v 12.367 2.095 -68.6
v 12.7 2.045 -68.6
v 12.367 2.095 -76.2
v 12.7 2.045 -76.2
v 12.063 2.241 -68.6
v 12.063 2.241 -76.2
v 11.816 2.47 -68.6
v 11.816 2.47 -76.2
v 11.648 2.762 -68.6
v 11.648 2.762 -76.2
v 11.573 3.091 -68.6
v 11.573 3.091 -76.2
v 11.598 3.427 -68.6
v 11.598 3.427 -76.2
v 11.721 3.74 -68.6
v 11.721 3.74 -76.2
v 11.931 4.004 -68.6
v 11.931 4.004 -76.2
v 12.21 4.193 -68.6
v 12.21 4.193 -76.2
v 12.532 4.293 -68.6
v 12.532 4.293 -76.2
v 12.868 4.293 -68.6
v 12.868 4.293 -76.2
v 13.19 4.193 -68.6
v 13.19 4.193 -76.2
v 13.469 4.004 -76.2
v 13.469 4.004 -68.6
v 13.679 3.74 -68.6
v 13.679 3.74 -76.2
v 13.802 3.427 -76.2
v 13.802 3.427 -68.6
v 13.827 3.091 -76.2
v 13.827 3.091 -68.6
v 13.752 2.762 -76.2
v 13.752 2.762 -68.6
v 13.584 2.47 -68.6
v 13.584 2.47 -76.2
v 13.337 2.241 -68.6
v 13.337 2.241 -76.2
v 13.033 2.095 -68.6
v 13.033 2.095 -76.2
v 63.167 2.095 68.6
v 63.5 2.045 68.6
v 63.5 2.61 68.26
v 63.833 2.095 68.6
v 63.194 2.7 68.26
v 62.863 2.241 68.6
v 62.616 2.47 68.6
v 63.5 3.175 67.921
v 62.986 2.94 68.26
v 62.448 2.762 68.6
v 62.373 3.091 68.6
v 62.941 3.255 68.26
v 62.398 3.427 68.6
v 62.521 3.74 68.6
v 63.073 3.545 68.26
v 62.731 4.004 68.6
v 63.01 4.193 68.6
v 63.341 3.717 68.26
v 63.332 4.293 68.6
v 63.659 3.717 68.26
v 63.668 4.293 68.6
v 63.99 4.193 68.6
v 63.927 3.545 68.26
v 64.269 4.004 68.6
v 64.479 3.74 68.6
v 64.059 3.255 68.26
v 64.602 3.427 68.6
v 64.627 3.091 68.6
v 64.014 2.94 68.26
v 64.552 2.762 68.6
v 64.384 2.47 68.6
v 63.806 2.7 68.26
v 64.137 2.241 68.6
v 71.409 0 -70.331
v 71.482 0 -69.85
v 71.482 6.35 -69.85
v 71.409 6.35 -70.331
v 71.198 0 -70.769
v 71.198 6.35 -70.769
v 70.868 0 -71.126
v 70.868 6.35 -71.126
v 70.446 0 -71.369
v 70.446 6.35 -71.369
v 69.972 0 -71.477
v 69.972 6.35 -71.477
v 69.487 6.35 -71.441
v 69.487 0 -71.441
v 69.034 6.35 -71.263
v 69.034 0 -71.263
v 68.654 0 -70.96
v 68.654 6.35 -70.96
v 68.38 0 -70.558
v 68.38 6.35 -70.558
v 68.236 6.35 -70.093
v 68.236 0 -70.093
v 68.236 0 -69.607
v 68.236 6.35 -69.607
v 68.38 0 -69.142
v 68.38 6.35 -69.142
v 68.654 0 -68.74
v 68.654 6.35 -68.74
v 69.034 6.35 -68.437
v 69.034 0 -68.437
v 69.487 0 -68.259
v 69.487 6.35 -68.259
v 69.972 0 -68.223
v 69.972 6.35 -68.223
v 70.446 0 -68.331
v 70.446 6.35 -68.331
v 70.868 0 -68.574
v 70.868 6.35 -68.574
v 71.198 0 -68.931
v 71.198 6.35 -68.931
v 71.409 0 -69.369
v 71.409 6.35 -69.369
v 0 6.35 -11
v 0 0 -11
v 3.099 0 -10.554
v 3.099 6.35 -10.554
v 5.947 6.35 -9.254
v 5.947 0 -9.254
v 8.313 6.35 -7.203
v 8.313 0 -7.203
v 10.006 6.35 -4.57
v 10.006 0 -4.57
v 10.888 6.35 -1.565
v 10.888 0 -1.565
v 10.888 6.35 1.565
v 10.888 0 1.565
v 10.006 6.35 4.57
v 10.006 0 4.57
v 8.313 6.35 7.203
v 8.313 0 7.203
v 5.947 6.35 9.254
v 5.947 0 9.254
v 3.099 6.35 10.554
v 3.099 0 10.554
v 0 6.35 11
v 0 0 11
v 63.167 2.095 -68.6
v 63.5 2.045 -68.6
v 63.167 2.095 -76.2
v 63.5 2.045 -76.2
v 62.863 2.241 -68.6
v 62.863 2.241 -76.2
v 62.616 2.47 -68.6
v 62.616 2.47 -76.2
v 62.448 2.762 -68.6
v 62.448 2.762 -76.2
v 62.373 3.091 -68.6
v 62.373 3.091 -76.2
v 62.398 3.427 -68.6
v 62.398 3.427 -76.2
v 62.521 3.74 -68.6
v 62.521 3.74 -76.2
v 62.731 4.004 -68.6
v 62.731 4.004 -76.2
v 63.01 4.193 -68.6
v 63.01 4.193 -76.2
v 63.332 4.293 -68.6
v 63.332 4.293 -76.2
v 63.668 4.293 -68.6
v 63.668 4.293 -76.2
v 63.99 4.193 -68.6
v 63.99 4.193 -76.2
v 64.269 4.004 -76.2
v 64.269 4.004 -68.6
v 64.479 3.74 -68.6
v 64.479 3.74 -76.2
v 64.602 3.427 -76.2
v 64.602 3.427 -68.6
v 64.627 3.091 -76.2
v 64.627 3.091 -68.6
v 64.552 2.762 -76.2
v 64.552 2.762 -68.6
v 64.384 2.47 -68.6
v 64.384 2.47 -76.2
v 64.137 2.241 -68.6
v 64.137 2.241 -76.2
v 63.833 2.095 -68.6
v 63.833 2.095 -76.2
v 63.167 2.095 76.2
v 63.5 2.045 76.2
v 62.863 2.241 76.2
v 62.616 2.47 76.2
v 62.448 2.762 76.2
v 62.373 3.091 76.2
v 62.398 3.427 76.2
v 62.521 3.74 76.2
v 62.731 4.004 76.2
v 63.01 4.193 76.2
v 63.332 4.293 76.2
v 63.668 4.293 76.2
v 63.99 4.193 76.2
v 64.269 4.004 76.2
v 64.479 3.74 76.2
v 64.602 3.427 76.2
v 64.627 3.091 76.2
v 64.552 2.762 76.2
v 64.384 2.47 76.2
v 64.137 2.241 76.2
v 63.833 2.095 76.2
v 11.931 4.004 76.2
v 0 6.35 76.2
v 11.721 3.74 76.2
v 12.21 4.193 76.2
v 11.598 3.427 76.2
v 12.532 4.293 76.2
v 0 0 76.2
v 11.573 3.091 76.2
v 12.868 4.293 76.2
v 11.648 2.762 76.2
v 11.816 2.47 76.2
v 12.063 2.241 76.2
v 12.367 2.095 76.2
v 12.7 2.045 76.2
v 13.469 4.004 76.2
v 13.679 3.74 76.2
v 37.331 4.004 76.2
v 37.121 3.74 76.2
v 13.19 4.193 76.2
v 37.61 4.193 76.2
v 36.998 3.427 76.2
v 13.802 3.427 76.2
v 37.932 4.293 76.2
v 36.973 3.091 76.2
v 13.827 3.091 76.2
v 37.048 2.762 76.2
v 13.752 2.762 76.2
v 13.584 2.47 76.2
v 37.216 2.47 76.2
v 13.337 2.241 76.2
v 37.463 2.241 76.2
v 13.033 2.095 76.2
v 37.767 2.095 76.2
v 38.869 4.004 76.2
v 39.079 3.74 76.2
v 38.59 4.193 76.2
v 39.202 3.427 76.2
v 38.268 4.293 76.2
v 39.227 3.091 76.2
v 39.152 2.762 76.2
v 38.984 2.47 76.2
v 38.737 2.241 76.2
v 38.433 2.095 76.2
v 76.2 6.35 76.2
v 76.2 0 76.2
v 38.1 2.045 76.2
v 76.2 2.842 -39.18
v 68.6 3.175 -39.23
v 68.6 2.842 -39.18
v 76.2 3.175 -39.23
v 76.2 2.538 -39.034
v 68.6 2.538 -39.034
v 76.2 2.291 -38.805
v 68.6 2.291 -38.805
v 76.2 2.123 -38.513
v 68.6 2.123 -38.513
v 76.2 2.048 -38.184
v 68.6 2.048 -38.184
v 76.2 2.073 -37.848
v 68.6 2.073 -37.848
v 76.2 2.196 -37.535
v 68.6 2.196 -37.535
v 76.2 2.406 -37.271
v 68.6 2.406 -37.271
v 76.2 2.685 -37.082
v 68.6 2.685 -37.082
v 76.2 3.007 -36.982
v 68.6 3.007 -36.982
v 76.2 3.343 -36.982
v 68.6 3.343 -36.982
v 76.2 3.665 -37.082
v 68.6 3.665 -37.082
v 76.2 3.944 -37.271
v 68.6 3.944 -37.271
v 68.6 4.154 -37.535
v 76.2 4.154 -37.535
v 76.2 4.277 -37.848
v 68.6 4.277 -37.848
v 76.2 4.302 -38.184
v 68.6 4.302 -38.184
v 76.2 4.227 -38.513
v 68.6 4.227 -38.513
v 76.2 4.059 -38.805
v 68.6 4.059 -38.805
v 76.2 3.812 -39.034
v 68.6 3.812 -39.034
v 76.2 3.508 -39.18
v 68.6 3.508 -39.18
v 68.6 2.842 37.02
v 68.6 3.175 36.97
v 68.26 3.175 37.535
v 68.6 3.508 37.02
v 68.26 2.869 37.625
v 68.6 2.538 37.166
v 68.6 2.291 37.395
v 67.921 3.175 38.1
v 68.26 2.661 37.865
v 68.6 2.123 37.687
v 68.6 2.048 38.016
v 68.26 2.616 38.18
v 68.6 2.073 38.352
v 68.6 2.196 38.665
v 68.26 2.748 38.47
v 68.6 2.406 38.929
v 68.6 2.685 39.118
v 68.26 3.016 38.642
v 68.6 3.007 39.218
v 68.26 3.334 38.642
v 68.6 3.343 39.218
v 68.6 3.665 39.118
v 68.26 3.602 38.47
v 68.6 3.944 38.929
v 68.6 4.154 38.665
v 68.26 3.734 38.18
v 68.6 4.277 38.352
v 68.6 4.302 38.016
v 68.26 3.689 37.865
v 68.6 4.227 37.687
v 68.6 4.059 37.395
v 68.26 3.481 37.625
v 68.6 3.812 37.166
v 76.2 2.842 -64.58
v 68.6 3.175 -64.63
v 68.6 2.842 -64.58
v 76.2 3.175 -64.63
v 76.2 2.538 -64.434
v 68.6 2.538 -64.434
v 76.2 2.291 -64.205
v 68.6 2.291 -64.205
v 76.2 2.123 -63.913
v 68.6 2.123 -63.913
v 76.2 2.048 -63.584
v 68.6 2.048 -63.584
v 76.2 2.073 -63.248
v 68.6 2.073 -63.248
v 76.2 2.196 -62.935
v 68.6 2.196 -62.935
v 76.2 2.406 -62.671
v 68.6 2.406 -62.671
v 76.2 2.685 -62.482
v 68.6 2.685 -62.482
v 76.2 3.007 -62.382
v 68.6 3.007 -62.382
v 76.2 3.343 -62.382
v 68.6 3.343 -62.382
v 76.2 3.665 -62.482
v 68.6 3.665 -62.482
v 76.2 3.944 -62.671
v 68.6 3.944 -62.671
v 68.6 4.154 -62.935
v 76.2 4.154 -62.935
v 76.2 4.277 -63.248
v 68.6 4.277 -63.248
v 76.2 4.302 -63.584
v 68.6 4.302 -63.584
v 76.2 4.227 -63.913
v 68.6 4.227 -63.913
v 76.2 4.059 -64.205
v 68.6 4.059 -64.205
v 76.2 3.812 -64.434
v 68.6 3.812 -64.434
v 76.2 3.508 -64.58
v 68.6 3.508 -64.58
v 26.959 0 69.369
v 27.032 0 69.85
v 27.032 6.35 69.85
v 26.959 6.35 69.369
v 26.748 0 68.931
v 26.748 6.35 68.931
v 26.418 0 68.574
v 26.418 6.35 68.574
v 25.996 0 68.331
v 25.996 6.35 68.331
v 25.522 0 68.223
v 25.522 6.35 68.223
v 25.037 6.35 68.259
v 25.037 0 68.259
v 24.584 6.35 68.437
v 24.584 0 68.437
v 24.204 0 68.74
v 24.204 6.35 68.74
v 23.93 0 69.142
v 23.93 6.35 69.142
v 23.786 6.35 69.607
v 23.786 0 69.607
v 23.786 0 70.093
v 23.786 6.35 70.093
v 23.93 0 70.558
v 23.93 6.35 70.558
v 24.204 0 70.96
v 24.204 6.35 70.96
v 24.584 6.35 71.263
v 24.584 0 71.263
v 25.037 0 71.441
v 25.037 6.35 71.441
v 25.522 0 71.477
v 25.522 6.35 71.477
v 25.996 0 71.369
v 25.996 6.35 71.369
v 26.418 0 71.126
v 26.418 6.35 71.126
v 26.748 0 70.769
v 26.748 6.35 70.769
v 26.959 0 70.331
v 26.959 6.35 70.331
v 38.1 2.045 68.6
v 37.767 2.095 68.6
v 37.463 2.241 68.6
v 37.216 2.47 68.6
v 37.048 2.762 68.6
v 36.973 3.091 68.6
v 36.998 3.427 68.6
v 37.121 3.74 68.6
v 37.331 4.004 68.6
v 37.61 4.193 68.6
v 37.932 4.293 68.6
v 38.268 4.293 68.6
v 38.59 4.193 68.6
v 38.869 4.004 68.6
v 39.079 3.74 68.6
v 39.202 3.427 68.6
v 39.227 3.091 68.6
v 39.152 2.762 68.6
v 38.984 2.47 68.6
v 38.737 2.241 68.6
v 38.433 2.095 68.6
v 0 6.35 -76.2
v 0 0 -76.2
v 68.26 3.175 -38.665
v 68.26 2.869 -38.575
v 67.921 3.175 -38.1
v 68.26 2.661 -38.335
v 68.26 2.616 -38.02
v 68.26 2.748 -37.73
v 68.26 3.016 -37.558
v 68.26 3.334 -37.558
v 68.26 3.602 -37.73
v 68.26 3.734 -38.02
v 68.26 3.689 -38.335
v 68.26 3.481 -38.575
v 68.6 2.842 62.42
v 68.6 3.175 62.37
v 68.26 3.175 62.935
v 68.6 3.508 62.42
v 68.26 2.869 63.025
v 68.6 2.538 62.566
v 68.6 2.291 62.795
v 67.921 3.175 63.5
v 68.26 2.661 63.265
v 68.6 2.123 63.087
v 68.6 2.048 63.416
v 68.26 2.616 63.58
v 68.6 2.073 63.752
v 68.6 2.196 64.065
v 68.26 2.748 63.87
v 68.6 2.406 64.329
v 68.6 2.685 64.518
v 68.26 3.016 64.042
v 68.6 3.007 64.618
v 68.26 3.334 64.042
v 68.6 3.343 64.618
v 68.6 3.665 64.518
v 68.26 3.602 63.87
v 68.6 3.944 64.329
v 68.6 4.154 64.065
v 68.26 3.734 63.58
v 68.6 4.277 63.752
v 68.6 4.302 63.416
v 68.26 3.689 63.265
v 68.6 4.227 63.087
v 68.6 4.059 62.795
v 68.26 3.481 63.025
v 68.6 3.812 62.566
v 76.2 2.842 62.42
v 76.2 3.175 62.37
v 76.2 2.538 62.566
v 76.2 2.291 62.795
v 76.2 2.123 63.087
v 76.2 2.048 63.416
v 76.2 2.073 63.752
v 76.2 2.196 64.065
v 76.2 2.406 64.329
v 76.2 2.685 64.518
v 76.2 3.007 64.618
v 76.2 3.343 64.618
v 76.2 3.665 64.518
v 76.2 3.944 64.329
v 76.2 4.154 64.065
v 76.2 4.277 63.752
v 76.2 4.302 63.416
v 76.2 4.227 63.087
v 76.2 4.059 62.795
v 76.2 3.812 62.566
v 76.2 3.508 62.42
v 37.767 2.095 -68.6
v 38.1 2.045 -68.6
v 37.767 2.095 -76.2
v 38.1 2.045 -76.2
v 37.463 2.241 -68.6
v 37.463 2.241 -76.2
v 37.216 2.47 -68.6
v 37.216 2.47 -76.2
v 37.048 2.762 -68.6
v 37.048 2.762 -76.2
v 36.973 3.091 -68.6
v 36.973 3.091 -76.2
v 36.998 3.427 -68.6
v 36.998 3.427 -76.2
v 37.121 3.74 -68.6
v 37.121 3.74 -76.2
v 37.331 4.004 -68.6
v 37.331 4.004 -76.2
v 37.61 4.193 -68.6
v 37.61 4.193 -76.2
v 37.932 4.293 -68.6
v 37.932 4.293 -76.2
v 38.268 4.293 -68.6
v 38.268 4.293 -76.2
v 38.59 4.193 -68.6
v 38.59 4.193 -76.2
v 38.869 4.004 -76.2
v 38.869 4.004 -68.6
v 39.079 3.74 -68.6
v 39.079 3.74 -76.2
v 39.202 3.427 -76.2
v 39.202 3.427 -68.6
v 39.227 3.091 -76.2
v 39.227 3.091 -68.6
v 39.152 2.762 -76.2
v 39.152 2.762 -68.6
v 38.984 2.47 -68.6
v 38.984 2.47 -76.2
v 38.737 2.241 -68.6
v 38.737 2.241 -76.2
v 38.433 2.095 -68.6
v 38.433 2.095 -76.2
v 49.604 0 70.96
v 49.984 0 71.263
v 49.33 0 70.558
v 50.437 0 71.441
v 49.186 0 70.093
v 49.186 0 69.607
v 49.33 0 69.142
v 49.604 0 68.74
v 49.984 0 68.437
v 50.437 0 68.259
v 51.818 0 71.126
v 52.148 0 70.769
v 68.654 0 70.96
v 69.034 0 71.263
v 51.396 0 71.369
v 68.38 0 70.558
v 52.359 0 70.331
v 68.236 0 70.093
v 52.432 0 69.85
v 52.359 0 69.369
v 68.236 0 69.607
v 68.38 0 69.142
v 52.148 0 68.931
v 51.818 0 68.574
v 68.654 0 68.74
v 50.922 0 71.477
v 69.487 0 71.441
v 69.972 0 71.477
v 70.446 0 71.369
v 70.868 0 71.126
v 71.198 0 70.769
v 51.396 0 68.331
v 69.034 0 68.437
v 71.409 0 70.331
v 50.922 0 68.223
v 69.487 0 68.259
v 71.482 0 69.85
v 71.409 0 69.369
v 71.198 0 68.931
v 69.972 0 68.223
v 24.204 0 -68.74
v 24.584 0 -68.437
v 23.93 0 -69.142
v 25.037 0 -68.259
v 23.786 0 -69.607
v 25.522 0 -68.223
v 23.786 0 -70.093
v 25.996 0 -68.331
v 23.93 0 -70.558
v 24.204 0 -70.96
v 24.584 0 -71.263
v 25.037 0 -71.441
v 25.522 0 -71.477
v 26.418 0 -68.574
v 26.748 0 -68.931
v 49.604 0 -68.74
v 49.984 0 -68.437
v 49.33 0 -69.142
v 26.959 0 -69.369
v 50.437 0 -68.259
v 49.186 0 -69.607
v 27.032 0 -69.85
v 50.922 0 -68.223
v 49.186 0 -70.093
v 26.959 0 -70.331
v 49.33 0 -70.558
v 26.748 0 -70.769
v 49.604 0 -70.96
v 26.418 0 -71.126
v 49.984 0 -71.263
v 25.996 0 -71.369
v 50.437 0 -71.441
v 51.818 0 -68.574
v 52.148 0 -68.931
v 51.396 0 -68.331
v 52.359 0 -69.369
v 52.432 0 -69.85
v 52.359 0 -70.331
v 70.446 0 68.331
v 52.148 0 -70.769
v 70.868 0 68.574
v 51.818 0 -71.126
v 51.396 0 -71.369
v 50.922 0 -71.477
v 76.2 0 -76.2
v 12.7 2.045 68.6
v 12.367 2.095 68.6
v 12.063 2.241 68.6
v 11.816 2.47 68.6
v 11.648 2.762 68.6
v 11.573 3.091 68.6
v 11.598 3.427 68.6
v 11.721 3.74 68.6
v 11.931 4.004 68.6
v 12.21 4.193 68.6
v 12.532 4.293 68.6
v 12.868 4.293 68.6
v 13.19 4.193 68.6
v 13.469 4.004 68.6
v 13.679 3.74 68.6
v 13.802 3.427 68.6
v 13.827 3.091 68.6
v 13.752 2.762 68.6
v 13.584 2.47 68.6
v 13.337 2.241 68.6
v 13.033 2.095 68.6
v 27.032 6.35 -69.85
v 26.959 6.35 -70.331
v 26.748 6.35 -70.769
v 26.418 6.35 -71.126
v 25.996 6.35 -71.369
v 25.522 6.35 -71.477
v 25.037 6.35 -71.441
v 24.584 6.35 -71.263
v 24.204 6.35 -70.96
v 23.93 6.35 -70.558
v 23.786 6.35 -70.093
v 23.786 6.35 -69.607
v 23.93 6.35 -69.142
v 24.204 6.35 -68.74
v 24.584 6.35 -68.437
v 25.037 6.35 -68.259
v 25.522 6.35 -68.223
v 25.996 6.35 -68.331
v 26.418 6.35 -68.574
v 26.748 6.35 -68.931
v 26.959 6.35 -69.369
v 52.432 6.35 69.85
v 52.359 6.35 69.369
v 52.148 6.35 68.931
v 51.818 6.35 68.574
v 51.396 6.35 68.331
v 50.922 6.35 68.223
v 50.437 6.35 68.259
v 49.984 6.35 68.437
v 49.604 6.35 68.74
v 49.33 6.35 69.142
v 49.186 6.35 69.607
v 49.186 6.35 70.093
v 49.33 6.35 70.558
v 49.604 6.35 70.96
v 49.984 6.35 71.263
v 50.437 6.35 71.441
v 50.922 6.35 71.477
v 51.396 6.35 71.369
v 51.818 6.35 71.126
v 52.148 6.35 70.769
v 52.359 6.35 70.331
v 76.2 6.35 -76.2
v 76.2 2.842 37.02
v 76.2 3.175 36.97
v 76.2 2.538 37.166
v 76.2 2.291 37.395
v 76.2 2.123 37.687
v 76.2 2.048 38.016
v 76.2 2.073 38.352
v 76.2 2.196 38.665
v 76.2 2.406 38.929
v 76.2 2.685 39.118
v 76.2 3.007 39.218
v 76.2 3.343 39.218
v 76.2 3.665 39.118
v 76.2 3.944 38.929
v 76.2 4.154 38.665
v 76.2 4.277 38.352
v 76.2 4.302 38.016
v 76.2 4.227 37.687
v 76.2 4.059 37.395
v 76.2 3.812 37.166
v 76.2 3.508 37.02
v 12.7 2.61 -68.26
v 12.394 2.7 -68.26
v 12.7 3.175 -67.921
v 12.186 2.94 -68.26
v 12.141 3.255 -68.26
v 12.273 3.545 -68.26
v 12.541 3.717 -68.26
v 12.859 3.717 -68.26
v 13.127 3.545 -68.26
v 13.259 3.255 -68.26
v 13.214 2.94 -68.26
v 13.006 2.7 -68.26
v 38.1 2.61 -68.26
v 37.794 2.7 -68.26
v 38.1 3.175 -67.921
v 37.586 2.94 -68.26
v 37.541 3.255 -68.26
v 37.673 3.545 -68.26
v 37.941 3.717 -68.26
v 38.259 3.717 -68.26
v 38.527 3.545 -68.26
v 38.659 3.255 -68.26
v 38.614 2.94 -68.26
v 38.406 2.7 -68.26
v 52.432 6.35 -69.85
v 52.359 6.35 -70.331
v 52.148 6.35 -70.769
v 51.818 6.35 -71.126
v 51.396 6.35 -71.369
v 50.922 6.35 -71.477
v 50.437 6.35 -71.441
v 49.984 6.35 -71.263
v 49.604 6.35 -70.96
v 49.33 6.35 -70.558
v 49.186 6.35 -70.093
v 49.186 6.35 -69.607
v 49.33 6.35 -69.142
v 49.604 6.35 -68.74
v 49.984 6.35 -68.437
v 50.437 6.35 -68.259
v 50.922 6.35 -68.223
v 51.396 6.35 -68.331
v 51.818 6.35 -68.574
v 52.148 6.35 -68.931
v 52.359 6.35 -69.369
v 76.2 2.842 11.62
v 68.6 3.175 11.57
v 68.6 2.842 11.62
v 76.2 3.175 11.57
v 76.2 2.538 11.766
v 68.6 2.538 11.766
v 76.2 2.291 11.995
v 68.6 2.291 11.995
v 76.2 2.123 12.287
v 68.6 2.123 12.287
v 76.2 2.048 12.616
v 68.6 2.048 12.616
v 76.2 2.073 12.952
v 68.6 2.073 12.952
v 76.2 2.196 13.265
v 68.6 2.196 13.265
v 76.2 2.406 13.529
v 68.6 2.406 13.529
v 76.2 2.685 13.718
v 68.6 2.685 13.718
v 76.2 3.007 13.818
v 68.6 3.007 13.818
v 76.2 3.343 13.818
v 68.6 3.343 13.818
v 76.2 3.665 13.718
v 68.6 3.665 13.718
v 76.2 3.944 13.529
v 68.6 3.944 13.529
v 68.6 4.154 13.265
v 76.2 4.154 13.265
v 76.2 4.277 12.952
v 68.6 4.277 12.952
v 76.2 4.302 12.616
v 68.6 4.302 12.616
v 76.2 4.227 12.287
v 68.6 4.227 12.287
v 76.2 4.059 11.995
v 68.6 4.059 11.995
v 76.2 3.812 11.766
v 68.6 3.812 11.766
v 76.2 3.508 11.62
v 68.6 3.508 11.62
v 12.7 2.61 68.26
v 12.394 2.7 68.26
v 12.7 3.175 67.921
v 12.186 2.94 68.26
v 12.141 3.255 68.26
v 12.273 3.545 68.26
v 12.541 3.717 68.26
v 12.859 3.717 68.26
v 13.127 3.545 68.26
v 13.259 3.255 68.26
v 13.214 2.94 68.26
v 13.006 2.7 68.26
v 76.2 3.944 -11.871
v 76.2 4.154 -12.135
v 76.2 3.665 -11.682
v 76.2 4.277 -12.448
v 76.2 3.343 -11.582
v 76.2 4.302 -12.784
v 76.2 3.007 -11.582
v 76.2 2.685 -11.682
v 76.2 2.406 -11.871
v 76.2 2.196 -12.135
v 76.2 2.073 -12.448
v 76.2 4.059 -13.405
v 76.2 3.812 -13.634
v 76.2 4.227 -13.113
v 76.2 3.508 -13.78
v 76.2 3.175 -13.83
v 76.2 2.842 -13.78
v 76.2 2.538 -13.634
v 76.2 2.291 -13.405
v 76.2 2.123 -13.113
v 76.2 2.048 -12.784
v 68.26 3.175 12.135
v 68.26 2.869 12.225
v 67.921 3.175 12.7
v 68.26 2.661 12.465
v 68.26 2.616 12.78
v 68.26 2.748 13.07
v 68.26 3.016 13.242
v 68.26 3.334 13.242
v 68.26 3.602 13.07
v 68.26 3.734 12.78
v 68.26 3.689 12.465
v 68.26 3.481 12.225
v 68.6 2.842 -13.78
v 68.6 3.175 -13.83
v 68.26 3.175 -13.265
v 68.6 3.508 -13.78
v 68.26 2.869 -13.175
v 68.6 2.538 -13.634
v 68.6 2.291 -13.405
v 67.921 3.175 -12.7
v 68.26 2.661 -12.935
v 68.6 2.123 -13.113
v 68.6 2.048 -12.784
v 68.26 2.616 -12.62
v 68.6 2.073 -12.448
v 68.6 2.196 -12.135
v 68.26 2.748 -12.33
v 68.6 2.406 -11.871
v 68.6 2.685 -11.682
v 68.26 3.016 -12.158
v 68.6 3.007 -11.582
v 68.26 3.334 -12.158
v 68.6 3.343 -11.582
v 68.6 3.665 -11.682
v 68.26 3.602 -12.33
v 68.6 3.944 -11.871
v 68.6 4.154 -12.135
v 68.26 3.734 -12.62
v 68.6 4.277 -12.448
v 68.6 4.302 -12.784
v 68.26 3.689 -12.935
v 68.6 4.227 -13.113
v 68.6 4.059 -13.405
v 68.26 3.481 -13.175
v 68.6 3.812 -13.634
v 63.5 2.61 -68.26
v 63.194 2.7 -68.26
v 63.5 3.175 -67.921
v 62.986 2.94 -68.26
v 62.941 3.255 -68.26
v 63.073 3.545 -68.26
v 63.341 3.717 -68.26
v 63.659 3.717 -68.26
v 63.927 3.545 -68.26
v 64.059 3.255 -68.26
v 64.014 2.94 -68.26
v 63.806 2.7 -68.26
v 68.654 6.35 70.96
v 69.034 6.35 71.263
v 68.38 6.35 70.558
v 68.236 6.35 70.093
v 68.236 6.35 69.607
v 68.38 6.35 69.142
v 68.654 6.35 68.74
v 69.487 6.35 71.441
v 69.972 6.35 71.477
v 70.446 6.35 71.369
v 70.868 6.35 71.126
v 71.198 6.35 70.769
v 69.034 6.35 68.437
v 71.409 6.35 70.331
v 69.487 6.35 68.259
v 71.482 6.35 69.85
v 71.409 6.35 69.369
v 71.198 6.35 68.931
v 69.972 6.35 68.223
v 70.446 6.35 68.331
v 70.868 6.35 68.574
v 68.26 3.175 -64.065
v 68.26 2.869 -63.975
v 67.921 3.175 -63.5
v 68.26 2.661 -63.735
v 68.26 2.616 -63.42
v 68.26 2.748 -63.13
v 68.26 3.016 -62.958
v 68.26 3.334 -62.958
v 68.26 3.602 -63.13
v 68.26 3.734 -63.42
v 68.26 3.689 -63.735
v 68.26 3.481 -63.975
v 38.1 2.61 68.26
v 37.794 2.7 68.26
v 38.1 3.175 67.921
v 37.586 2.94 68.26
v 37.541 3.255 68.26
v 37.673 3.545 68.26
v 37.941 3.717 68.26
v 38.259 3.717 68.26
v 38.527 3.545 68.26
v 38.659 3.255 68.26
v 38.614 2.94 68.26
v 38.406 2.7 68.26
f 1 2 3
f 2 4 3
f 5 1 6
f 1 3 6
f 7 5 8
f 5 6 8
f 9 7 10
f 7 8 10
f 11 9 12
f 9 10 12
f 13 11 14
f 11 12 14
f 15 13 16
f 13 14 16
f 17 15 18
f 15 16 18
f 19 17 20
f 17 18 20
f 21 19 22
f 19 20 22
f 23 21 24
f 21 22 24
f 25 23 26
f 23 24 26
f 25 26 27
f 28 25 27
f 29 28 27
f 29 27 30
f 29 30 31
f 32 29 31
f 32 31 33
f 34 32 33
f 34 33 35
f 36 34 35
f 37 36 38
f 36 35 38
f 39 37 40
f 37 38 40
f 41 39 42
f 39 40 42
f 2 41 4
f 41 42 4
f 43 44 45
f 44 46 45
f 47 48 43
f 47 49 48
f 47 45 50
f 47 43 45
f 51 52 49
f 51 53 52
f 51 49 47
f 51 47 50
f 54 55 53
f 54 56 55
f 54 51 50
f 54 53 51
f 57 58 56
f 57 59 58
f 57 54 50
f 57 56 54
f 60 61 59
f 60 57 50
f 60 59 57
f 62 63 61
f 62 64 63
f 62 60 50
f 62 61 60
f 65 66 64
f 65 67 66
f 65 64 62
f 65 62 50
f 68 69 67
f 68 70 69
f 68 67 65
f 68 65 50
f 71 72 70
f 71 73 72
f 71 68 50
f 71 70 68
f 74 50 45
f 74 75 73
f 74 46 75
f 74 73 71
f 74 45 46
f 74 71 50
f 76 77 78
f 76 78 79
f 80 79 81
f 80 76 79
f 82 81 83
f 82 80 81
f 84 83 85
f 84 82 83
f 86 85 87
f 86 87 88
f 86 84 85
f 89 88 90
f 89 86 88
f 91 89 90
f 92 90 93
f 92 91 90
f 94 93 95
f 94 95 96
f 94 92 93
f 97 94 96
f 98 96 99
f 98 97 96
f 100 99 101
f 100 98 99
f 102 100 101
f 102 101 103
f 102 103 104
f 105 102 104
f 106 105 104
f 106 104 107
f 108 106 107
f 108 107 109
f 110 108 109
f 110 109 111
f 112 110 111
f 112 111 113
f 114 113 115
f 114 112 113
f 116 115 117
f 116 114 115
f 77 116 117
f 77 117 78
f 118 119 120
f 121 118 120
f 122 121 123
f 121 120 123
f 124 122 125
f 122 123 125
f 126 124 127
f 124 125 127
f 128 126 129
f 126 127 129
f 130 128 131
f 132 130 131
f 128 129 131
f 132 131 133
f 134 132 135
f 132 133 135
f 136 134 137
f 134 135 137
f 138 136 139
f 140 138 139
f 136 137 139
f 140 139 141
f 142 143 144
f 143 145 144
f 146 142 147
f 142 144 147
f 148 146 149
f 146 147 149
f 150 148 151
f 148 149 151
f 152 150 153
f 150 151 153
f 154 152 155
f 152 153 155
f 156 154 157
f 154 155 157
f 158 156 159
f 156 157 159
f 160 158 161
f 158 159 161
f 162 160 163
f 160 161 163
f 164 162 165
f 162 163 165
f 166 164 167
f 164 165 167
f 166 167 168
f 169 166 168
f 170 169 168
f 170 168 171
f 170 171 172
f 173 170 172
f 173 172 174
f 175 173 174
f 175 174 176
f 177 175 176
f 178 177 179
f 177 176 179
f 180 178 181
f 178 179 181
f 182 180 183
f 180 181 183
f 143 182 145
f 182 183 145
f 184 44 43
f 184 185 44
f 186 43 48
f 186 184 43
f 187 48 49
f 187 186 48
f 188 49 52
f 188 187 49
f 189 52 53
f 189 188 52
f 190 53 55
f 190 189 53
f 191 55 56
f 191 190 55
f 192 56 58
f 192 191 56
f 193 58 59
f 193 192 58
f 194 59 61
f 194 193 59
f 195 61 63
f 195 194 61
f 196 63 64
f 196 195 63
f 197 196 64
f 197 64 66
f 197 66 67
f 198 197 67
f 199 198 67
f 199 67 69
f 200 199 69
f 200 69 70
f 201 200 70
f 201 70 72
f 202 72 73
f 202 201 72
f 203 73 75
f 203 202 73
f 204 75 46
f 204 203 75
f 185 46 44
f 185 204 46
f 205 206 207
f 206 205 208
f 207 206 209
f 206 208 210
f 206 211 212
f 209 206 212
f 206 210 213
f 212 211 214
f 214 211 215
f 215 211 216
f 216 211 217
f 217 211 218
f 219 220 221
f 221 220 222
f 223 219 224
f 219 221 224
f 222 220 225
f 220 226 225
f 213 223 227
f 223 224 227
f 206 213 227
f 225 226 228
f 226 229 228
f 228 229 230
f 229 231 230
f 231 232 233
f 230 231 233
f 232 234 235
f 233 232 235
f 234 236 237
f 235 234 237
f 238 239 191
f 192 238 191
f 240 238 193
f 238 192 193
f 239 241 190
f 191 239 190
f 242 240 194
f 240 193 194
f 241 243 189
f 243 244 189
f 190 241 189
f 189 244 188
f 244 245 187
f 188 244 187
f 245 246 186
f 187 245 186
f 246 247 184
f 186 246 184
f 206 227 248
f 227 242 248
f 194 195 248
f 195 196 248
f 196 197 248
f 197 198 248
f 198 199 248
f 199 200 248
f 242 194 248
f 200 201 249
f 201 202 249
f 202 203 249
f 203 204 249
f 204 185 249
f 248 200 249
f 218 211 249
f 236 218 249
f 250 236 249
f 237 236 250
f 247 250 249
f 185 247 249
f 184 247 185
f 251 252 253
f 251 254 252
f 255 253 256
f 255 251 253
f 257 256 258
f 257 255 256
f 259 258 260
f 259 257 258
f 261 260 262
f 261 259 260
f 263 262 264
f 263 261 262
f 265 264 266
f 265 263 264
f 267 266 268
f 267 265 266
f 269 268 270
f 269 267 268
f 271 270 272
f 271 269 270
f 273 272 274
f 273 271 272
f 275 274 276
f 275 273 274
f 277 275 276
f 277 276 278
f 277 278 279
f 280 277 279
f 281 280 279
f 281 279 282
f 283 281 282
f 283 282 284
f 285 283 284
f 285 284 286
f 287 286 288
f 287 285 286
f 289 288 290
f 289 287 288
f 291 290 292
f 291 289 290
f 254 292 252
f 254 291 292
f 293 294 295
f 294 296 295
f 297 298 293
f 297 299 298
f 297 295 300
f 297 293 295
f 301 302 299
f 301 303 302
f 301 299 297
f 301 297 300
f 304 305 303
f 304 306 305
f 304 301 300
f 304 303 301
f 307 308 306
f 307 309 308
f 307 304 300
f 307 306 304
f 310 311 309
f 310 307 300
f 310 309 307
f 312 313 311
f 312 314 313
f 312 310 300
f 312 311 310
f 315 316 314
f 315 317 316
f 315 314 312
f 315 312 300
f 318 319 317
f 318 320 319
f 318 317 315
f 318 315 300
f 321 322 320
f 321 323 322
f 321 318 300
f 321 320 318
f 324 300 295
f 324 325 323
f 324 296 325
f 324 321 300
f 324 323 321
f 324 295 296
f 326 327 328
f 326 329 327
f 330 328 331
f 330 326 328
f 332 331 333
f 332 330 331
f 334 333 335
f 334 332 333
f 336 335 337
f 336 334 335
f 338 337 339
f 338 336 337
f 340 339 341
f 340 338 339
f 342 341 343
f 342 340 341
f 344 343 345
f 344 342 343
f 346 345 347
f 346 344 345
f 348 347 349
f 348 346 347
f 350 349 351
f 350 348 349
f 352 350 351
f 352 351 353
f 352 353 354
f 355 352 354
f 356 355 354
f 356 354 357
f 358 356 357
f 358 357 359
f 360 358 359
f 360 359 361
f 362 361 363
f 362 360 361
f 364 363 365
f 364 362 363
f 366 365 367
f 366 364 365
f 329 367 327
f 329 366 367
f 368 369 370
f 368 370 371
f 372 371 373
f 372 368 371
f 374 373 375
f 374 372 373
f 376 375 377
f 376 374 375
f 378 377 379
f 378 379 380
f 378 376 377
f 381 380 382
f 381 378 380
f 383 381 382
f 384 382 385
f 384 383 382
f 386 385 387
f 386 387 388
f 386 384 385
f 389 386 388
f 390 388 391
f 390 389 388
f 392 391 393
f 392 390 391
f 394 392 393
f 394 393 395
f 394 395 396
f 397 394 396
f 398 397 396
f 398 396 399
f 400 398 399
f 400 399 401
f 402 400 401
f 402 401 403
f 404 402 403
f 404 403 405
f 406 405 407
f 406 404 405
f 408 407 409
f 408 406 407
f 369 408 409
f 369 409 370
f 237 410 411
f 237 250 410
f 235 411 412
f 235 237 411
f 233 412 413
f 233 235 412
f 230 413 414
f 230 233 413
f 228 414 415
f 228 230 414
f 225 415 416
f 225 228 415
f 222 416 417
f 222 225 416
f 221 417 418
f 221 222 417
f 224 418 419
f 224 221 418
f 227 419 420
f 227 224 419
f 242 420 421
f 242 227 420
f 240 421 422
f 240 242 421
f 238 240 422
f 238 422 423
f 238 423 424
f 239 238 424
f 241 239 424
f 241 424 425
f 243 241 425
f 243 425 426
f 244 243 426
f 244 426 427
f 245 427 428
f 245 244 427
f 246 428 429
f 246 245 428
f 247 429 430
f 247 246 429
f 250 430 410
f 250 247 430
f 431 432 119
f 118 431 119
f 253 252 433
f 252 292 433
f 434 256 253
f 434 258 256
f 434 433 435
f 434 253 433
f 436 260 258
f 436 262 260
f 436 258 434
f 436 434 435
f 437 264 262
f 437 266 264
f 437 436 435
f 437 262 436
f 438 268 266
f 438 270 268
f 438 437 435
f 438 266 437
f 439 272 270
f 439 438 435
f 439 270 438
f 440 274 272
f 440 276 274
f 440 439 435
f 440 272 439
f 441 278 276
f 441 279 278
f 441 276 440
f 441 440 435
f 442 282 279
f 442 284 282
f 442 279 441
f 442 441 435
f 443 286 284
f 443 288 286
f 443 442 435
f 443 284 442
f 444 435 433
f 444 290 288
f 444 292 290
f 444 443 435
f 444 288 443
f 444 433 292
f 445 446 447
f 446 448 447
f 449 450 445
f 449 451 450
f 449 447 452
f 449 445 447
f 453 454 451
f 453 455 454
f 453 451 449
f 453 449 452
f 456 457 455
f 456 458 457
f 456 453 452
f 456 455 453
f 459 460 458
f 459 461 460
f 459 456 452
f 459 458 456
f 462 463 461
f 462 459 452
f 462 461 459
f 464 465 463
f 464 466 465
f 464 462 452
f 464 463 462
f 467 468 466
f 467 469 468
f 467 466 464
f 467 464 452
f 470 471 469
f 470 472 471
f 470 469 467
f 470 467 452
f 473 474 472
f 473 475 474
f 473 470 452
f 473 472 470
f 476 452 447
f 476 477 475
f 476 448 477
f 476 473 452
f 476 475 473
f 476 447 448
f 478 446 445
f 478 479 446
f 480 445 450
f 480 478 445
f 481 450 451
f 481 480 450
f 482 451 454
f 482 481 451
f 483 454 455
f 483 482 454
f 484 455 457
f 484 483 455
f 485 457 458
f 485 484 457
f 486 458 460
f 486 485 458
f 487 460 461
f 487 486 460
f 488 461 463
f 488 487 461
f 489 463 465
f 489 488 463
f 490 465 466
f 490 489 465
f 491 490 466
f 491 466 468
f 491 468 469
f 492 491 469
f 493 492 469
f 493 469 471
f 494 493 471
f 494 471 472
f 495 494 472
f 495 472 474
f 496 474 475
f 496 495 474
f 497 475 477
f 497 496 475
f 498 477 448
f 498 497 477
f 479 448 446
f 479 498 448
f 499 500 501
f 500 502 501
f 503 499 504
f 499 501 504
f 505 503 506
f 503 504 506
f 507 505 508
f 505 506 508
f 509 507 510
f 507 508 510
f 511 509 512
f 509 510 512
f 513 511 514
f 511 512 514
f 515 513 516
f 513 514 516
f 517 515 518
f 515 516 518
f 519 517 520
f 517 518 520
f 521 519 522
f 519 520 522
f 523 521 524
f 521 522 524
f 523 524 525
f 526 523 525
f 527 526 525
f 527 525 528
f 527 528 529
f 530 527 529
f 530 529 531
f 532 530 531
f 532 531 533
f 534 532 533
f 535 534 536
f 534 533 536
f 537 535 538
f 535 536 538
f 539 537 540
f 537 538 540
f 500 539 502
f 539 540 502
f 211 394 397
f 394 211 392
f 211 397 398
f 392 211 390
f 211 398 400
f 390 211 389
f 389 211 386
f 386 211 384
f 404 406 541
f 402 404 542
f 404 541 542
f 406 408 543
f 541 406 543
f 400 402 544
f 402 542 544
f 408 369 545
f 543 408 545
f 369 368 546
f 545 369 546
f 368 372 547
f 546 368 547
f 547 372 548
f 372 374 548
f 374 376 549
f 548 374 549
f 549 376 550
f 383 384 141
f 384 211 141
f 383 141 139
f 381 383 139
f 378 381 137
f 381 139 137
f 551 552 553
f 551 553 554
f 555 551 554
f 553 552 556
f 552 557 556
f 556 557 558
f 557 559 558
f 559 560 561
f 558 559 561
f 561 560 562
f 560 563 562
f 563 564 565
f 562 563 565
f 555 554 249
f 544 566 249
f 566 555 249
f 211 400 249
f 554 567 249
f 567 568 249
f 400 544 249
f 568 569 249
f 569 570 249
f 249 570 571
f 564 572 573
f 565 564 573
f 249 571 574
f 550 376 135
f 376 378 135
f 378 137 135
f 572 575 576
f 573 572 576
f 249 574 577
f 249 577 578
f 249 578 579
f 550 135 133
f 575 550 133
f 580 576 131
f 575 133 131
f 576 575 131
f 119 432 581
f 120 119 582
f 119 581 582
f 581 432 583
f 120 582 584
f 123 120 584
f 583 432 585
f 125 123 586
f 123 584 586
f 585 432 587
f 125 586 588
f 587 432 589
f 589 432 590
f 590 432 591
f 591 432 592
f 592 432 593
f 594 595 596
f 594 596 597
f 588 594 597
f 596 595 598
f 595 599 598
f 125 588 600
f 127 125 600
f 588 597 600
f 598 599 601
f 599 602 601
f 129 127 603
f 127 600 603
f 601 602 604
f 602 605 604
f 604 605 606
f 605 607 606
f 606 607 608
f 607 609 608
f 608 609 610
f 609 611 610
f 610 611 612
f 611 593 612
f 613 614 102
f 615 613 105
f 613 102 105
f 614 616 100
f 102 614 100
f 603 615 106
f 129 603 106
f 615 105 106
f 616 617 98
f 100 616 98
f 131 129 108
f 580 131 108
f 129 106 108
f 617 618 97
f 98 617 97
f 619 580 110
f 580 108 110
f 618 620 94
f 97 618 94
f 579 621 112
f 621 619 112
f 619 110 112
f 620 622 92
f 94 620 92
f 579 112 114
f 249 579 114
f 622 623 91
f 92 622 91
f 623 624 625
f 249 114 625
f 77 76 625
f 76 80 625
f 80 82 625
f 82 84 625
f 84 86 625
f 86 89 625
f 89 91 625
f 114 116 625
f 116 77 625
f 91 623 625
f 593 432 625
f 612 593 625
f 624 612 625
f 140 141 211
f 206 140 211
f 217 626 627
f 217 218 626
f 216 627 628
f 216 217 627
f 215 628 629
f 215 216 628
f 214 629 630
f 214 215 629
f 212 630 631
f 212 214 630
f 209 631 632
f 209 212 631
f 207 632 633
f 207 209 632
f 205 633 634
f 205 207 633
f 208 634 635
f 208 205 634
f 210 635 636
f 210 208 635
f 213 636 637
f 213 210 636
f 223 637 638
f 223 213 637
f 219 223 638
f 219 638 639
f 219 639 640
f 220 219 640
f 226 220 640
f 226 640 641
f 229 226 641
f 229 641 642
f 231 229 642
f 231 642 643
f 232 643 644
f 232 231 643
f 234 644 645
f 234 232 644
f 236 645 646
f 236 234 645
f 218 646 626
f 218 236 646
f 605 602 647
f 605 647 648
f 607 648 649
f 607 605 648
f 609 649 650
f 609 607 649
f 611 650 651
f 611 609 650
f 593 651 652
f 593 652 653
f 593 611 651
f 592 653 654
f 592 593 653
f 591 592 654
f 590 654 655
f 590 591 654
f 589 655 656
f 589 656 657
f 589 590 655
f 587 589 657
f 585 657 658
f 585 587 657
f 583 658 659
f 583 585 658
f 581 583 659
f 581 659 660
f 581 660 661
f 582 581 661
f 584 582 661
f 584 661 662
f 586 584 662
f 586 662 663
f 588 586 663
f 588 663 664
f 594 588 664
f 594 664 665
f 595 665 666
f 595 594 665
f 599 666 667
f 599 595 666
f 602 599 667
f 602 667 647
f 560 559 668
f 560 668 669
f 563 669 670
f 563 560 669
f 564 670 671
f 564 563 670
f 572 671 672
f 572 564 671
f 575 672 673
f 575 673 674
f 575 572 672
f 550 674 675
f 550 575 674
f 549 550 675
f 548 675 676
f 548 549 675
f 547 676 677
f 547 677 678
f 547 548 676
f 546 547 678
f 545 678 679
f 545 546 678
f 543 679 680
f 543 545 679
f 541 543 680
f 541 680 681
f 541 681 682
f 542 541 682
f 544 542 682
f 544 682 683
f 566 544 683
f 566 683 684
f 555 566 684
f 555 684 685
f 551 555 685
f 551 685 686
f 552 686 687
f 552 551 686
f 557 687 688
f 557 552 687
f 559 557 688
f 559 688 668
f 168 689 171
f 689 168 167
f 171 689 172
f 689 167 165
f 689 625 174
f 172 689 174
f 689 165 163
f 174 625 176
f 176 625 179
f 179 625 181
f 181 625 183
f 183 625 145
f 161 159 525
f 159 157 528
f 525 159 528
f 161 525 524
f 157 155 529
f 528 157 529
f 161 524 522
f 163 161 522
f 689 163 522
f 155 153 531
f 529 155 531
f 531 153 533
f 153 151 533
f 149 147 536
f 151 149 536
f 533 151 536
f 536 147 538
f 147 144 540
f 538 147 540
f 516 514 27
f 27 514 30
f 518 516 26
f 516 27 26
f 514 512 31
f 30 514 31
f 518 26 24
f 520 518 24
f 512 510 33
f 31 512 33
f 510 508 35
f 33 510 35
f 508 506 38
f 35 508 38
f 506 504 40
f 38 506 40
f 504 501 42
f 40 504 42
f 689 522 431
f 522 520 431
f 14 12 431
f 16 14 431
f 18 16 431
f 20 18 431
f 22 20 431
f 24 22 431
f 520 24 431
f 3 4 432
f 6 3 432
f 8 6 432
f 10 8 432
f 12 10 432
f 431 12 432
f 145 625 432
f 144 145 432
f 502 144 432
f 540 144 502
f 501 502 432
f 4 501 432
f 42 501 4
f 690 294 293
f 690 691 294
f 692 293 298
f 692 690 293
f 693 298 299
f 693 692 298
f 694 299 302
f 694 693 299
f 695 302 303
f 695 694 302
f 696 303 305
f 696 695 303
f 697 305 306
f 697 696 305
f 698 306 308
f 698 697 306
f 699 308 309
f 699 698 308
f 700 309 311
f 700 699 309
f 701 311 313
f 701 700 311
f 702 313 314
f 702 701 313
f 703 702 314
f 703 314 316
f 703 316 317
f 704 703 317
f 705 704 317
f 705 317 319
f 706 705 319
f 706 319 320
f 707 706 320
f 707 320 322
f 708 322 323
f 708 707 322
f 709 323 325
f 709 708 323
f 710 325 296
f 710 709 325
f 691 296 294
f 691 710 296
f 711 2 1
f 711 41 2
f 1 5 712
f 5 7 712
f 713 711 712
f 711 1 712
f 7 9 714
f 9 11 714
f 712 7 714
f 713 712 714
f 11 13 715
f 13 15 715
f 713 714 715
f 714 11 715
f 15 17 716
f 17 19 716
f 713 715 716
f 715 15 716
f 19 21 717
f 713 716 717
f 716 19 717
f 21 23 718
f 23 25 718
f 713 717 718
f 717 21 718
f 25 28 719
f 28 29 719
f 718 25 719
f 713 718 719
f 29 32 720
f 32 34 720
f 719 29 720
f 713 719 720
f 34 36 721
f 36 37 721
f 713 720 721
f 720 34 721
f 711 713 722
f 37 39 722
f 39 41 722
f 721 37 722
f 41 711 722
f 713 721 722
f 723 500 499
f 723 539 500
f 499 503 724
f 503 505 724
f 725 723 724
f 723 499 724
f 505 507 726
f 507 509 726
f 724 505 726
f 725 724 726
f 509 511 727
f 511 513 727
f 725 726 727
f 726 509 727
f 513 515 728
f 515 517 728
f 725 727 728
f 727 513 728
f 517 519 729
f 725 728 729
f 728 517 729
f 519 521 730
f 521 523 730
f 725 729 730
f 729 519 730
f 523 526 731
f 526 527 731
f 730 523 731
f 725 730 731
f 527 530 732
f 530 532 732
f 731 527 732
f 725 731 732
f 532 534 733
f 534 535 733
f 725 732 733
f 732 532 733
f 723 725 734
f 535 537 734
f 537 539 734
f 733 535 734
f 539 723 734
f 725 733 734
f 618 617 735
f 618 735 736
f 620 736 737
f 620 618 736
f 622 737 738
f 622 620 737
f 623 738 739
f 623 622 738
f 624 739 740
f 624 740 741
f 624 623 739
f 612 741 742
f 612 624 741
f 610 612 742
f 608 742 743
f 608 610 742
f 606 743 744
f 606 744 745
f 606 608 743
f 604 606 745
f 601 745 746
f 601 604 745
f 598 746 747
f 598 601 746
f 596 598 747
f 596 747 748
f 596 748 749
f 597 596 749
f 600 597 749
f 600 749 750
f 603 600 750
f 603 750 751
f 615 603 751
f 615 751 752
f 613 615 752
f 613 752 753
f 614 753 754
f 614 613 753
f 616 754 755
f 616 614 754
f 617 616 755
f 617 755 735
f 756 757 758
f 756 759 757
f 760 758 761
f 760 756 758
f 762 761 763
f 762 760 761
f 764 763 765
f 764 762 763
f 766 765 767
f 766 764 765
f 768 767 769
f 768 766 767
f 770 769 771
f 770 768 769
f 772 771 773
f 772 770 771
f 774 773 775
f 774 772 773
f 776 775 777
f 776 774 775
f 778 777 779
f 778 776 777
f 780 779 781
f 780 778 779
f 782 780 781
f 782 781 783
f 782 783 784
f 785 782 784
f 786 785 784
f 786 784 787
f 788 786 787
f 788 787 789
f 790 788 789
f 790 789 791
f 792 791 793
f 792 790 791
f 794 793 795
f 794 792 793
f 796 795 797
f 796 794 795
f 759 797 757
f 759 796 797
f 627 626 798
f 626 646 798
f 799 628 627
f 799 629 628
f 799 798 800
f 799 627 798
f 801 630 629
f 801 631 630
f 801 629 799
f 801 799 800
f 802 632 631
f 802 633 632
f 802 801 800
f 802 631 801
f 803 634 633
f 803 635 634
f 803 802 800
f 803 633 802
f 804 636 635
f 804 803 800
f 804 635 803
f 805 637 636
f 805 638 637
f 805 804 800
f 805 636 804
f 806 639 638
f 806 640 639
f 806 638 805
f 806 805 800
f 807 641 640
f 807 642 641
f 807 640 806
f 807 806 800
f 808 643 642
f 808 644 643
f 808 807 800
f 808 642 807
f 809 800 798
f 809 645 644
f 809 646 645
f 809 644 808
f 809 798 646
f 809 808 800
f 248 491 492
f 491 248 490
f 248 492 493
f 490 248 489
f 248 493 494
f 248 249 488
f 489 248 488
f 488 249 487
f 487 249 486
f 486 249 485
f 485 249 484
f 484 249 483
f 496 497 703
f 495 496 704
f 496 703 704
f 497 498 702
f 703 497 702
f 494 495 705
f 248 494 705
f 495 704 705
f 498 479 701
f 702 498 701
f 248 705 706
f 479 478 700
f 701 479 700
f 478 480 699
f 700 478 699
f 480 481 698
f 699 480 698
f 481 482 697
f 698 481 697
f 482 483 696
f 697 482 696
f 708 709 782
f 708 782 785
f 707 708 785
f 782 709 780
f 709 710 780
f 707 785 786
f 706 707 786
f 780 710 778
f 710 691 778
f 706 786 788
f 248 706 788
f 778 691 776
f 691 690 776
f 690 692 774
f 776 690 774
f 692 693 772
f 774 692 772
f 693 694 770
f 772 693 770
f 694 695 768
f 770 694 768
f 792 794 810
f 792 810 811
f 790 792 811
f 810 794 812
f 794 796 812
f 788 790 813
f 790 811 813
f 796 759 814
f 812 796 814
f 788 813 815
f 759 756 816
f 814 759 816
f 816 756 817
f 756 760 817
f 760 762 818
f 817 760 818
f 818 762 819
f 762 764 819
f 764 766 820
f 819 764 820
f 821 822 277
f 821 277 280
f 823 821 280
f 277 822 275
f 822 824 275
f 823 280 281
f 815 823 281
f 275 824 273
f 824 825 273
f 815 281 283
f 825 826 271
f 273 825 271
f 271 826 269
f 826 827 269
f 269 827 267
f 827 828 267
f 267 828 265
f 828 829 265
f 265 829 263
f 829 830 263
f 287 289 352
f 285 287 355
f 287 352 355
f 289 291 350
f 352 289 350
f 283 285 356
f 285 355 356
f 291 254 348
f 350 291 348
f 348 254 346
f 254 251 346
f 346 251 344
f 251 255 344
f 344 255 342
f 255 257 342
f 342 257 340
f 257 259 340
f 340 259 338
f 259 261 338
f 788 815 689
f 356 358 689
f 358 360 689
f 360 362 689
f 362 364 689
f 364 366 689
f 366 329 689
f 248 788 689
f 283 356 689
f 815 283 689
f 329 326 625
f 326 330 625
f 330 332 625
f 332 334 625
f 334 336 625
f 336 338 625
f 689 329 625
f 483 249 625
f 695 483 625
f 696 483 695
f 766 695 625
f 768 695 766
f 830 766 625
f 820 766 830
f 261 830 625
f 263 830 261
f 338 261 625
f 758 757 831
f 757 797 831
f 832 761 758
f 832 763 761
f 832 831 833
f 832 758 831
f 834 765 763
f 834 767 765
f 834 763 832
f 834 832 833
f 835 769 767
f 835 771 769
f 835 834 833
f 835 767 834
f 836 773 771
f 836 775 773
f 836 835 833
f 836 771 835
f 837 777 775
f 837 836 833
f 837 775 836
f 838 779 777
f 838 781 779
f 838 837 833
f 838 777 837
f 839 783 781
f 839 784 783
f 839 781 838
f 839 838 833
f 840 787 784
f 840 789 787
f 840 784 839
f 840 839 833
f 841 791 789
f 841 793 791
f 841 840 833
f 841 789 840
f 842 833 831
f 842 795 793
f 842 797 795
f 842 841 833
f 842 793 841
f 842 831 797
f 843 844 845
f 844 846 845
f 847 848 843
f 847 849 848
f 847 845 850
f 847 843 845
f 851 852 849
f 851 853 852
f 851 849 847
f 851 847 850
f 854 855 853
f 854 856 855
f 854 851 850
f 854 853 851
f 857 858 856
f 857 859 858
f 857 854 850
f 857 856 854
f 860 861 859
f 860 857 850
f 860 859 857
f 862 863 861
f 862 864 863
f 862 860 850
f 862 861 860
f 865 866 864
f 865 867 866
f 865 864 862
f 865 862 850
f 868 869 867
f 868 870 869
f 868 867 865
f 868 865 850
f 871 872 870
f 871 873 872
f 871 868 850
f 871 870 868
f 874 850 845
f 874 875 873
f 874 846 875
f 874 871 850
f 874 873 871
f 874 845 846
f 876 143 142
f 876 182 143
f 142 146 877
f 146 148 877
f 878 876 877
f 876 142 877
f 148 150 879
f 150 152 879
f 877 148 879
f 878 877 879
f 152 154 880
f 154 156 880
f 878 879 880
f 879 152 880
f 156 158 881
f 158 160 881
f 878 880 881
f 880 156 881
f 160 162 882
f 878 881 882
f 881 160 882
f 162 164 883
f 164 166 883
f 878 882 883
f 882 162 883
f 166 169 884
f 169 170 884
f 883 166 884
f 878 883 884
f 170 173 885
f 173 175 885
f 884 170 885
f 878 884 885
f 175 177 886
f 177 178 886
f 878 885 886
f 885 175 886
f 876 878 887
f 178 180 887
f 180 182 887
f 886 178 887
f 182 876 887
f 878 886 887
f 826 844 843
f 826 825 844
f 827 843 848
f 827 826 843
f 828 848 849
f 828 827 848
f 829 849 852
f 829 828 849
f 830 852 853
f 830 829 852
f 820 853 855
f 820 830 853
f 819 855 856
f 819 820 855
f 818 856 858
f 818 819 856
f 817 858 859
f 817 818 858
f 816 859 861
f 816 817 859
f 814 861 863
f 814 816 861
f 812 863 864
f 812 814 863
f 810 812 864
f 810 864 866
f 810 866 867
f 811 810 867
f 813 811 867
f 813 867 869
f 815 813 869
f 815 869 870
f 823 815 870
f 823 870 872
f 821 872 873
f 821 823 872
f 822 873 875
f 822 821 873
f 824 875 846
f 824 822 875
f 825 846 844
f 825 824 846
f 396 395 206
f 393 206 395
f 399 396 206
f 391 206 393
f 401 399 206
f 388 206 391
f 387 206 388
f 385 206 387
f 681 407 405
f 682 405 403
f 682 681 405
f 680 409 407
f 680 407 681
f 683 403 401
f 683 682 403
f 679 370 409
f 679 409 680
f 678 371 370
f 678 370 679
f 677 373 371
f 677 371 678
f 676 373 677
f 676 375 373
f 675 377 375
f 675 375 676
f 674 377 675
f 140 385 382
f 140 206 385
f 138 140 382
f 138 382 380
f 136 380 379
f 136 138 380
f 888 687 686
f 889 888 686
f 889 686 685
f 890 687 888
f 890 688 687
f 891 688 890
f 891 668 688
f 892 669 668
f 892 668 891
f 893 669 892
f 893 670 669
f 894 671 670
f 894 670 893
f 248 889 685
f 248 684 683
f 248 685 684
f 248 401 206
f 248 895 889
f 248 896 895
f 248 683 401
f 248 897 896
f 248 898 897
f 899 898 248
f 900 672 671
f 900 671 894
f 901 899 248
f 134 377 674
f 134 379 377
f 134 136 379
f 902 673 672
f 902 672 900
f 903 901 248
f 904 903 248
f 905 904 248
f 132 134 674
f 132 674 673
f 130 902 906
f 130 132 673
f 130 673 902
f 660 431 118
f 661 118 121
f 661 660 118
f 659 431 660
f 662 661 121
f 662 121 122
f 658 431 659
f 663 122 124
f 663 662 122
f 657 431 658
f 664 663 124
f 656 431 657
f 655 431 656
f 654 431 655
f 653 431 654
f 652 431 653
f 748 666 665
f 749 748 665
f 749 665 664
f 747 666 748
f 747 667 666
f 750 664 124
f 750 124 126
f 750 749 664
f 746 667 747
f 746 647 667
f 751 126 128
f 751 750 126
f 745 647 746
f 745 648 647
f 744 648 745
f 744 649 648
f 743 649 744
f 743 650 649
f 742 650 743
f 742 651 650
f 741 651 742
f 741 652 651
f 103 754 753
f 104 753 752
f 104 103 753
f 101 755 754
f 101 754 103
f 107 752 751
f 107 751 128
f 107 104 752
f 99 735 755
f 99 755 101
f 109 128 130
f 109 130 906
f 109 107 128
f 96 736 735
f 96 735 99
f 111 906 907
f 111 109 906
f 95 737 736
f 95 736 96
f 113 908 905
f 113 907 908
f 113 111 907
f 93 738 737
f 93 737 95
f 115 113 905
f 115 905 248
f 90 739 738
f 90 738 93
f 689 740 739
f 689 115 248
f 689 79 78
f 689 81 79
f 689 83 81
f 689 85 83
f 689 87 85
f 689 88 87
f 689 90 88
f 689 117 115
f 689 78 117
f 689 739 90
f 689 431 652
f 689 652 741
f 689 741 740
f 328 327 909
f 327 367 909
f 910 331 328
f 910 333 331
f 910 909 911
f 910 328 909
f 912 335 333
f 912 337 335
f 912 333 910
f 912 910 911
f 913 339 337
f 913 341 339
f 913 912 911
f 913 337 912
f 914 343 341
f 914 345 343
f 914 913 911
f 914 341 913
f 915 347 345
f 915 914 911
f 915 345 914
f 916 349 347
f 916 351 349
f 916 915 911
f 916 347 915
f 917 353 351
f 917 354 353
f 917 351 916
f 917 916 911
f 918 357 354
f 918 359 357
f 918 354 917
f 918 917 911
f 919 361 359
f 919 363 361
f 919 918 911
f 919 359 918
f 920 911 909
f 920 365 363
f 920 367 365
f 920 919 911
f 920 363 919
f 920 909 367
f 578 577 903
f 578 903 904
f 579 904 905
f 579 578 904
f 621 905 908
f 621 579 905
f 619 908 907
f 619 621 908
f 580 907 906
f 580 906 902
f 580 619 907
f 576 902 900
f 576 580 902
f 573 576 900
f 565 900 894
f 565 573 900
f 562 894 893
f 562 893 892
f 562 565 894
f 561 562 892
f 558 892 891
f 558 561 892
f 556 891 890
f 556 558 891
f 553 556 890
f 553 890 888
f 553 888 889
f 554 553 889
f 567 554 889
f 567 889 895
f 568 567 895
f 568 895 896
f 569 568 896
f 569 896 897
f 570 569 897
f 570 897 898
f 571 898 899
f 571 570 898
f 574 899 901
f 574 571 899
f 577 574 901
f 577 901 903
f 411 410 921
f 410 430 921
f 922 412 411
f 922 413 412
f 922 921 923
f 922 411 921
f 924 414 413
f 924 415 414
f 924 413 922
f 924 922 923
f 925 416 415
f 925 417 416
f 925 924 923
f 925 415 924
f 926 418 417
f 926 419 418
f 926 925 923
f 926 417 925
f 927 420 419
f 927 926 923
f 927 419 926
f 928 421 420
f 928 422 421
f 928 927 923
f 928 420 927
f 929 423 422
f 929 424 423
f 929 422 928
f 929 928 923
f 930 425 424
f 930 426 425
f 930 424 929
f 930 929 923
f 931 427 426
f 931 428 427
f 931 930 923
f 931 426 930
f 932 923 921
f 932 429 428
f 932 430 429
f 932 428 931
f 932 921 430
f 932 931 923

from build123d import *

# Parameters (mm, degrees)
SKETCH1_R           = 1.63195
BOSS_EXTRUDE1_DEPTH = 6.35
LPATTERN1_COUNT     = 6
LPATTERN1_PITCH     = 25.4
LPATTERN2_COUNT     = 3
LPATTERN2_PITCH     = 25.4


with BuildPart() as part:
    # Sketch1 → Boss-Extrude1 (new body)
    with BuildSketch(Plane(origin=(0, 0, 0), x_dir=(1, 0, 0), z_dir=(0, 1, 0))):
        with BuildLine():
            Line((0, -11), (0, -76.2))
            Line((0, -76.2), (76.2, -76.2))
            Line((76.2, -76.2), (76.2, 76.2))
            Line((76.2, 76.2), (0, 76.2))
            Line((0, 76.2), (0, 11))
            ThreePointArc((0, 11), (11, 0), (0, -11))
        make_face()
        with Locations((69.85, 69.85)):
            Circle(SKETCH1_R, mode=Mode.SUBTRACT)
        with Locations((69.85, -69.85)):
            Circle(SKETCH1_R, mode=Mode.SUBTRACT)
        with Locations((50.8, 69.85)):
            Circle(SKETCH1_R, mode=Mode.SUBTRACT)
        with Locations((25.4, 69.85)):
            Circle(SKETCH1_R, mode=Mode.SUBTRACT)
        with Locations((50.8, -69.85)):
            Circle(SKETCH1_R, mode=Mode.SUBTRACT)
        with Locations((25.4, -69.85)):
            Circle(SKETCH1_R, mode=Mode.SUBTRACT)
    extrude(amount=BOSS_EXTRUDE1_DEPTH)

    # Sketch2 → #4-40 Tapped Hole1 (revolve, cut)
    with BuildSketch(Plane(origin=(76.2, 3.175, 63.5), x_dir=(0, 0, -1), z_dir=(0, 1, 0))):
        Polygon((0, 0), (0, 8.279152758), (1.1303, 7.6), (1.1303, 0), align=None)
    f_4_40_tapped_hole1 = revolve(axis=Axis((82.55, 3.175, 63.5), (-1, 0, 0)), mode=Mode.SUBTRACT)

    # LPattern1: #4-40 Tapped Hole1 ×6
    with Locations(*[(0, 0, -i * LPATTERN1_PITCH) for i in range(1, LPATTERN1_COUNT)]):
        add(f_4_40_tapped_hole1, mode=Mode.SUBTRACT)

    # Sketch3 → #4-40 Tapped Hole2 (revolve, cut)
    with BuildSketch(Plane(origin=(63.5, 3.175, 76.2), x_dir=(0, -1, 0), z_dir=(1, 0, 0))):
        Polygon((0, 0), (0, 8.279152758), (1.1303, 7.6), (1.1303, 0), align=None)
    f_4_40_tapped_hole2 = revolve(axis=Axis((63.5, 3.175, 82.55), (0, 0, -1)), mode=Mode.SUBTRACT)

    # LPattern2: #4-40 Tapped Hole2 ×3
    with Locations(*[(-i * LPATTERN2_PITCH, 0, 0) for i in range(1, LPATTERN2_COUNT)]):
        add(f_4_40_tapped_hole2, mode=Mode.SUBTRACT)

    # Mirror1: #4-40 Tapped Hole2 across plane
    add(f_4_40_tapped_hole2.mirror(Plane.XY), mode=Mode.SUBTRACT)

    # Mirror1 copy 1 sketch → Mirror1 copy 1 (revolve, cut)
    with BuildSketch(Plane(origin=(38.1, 3.175, -76.2), x_dir=(0, -1, 0), z_dir=(1, 0, 0))):
        Polygon((0, 0), (0, -8.279152758), (1.1303, -7.6), (1.1303, 0), align=None)
    revolve(axis=Axis((38.1, 3.175, -82.55), (0, 0, -1)), mode=Mode.SUBTRACT)

    # Mirror1 copy 2 sketch → Mirror1 copy 2 (revolve, cut)
    with BuildSketch(Plane(origin=(12.7, 3.175, -76.2), x_dir=(0, -1, 0), z_dir=(1, 0, 0))):
        Polygon((0, 0), (0, -8.279152758), (1.1303, -7.6), (1.1303, 0), align=None)
    revolve(axis=Axis((12.7, 3.175, -82.55), (0, 0, -1)), mode=Mode.SUBTRACT)


solid = part.part
